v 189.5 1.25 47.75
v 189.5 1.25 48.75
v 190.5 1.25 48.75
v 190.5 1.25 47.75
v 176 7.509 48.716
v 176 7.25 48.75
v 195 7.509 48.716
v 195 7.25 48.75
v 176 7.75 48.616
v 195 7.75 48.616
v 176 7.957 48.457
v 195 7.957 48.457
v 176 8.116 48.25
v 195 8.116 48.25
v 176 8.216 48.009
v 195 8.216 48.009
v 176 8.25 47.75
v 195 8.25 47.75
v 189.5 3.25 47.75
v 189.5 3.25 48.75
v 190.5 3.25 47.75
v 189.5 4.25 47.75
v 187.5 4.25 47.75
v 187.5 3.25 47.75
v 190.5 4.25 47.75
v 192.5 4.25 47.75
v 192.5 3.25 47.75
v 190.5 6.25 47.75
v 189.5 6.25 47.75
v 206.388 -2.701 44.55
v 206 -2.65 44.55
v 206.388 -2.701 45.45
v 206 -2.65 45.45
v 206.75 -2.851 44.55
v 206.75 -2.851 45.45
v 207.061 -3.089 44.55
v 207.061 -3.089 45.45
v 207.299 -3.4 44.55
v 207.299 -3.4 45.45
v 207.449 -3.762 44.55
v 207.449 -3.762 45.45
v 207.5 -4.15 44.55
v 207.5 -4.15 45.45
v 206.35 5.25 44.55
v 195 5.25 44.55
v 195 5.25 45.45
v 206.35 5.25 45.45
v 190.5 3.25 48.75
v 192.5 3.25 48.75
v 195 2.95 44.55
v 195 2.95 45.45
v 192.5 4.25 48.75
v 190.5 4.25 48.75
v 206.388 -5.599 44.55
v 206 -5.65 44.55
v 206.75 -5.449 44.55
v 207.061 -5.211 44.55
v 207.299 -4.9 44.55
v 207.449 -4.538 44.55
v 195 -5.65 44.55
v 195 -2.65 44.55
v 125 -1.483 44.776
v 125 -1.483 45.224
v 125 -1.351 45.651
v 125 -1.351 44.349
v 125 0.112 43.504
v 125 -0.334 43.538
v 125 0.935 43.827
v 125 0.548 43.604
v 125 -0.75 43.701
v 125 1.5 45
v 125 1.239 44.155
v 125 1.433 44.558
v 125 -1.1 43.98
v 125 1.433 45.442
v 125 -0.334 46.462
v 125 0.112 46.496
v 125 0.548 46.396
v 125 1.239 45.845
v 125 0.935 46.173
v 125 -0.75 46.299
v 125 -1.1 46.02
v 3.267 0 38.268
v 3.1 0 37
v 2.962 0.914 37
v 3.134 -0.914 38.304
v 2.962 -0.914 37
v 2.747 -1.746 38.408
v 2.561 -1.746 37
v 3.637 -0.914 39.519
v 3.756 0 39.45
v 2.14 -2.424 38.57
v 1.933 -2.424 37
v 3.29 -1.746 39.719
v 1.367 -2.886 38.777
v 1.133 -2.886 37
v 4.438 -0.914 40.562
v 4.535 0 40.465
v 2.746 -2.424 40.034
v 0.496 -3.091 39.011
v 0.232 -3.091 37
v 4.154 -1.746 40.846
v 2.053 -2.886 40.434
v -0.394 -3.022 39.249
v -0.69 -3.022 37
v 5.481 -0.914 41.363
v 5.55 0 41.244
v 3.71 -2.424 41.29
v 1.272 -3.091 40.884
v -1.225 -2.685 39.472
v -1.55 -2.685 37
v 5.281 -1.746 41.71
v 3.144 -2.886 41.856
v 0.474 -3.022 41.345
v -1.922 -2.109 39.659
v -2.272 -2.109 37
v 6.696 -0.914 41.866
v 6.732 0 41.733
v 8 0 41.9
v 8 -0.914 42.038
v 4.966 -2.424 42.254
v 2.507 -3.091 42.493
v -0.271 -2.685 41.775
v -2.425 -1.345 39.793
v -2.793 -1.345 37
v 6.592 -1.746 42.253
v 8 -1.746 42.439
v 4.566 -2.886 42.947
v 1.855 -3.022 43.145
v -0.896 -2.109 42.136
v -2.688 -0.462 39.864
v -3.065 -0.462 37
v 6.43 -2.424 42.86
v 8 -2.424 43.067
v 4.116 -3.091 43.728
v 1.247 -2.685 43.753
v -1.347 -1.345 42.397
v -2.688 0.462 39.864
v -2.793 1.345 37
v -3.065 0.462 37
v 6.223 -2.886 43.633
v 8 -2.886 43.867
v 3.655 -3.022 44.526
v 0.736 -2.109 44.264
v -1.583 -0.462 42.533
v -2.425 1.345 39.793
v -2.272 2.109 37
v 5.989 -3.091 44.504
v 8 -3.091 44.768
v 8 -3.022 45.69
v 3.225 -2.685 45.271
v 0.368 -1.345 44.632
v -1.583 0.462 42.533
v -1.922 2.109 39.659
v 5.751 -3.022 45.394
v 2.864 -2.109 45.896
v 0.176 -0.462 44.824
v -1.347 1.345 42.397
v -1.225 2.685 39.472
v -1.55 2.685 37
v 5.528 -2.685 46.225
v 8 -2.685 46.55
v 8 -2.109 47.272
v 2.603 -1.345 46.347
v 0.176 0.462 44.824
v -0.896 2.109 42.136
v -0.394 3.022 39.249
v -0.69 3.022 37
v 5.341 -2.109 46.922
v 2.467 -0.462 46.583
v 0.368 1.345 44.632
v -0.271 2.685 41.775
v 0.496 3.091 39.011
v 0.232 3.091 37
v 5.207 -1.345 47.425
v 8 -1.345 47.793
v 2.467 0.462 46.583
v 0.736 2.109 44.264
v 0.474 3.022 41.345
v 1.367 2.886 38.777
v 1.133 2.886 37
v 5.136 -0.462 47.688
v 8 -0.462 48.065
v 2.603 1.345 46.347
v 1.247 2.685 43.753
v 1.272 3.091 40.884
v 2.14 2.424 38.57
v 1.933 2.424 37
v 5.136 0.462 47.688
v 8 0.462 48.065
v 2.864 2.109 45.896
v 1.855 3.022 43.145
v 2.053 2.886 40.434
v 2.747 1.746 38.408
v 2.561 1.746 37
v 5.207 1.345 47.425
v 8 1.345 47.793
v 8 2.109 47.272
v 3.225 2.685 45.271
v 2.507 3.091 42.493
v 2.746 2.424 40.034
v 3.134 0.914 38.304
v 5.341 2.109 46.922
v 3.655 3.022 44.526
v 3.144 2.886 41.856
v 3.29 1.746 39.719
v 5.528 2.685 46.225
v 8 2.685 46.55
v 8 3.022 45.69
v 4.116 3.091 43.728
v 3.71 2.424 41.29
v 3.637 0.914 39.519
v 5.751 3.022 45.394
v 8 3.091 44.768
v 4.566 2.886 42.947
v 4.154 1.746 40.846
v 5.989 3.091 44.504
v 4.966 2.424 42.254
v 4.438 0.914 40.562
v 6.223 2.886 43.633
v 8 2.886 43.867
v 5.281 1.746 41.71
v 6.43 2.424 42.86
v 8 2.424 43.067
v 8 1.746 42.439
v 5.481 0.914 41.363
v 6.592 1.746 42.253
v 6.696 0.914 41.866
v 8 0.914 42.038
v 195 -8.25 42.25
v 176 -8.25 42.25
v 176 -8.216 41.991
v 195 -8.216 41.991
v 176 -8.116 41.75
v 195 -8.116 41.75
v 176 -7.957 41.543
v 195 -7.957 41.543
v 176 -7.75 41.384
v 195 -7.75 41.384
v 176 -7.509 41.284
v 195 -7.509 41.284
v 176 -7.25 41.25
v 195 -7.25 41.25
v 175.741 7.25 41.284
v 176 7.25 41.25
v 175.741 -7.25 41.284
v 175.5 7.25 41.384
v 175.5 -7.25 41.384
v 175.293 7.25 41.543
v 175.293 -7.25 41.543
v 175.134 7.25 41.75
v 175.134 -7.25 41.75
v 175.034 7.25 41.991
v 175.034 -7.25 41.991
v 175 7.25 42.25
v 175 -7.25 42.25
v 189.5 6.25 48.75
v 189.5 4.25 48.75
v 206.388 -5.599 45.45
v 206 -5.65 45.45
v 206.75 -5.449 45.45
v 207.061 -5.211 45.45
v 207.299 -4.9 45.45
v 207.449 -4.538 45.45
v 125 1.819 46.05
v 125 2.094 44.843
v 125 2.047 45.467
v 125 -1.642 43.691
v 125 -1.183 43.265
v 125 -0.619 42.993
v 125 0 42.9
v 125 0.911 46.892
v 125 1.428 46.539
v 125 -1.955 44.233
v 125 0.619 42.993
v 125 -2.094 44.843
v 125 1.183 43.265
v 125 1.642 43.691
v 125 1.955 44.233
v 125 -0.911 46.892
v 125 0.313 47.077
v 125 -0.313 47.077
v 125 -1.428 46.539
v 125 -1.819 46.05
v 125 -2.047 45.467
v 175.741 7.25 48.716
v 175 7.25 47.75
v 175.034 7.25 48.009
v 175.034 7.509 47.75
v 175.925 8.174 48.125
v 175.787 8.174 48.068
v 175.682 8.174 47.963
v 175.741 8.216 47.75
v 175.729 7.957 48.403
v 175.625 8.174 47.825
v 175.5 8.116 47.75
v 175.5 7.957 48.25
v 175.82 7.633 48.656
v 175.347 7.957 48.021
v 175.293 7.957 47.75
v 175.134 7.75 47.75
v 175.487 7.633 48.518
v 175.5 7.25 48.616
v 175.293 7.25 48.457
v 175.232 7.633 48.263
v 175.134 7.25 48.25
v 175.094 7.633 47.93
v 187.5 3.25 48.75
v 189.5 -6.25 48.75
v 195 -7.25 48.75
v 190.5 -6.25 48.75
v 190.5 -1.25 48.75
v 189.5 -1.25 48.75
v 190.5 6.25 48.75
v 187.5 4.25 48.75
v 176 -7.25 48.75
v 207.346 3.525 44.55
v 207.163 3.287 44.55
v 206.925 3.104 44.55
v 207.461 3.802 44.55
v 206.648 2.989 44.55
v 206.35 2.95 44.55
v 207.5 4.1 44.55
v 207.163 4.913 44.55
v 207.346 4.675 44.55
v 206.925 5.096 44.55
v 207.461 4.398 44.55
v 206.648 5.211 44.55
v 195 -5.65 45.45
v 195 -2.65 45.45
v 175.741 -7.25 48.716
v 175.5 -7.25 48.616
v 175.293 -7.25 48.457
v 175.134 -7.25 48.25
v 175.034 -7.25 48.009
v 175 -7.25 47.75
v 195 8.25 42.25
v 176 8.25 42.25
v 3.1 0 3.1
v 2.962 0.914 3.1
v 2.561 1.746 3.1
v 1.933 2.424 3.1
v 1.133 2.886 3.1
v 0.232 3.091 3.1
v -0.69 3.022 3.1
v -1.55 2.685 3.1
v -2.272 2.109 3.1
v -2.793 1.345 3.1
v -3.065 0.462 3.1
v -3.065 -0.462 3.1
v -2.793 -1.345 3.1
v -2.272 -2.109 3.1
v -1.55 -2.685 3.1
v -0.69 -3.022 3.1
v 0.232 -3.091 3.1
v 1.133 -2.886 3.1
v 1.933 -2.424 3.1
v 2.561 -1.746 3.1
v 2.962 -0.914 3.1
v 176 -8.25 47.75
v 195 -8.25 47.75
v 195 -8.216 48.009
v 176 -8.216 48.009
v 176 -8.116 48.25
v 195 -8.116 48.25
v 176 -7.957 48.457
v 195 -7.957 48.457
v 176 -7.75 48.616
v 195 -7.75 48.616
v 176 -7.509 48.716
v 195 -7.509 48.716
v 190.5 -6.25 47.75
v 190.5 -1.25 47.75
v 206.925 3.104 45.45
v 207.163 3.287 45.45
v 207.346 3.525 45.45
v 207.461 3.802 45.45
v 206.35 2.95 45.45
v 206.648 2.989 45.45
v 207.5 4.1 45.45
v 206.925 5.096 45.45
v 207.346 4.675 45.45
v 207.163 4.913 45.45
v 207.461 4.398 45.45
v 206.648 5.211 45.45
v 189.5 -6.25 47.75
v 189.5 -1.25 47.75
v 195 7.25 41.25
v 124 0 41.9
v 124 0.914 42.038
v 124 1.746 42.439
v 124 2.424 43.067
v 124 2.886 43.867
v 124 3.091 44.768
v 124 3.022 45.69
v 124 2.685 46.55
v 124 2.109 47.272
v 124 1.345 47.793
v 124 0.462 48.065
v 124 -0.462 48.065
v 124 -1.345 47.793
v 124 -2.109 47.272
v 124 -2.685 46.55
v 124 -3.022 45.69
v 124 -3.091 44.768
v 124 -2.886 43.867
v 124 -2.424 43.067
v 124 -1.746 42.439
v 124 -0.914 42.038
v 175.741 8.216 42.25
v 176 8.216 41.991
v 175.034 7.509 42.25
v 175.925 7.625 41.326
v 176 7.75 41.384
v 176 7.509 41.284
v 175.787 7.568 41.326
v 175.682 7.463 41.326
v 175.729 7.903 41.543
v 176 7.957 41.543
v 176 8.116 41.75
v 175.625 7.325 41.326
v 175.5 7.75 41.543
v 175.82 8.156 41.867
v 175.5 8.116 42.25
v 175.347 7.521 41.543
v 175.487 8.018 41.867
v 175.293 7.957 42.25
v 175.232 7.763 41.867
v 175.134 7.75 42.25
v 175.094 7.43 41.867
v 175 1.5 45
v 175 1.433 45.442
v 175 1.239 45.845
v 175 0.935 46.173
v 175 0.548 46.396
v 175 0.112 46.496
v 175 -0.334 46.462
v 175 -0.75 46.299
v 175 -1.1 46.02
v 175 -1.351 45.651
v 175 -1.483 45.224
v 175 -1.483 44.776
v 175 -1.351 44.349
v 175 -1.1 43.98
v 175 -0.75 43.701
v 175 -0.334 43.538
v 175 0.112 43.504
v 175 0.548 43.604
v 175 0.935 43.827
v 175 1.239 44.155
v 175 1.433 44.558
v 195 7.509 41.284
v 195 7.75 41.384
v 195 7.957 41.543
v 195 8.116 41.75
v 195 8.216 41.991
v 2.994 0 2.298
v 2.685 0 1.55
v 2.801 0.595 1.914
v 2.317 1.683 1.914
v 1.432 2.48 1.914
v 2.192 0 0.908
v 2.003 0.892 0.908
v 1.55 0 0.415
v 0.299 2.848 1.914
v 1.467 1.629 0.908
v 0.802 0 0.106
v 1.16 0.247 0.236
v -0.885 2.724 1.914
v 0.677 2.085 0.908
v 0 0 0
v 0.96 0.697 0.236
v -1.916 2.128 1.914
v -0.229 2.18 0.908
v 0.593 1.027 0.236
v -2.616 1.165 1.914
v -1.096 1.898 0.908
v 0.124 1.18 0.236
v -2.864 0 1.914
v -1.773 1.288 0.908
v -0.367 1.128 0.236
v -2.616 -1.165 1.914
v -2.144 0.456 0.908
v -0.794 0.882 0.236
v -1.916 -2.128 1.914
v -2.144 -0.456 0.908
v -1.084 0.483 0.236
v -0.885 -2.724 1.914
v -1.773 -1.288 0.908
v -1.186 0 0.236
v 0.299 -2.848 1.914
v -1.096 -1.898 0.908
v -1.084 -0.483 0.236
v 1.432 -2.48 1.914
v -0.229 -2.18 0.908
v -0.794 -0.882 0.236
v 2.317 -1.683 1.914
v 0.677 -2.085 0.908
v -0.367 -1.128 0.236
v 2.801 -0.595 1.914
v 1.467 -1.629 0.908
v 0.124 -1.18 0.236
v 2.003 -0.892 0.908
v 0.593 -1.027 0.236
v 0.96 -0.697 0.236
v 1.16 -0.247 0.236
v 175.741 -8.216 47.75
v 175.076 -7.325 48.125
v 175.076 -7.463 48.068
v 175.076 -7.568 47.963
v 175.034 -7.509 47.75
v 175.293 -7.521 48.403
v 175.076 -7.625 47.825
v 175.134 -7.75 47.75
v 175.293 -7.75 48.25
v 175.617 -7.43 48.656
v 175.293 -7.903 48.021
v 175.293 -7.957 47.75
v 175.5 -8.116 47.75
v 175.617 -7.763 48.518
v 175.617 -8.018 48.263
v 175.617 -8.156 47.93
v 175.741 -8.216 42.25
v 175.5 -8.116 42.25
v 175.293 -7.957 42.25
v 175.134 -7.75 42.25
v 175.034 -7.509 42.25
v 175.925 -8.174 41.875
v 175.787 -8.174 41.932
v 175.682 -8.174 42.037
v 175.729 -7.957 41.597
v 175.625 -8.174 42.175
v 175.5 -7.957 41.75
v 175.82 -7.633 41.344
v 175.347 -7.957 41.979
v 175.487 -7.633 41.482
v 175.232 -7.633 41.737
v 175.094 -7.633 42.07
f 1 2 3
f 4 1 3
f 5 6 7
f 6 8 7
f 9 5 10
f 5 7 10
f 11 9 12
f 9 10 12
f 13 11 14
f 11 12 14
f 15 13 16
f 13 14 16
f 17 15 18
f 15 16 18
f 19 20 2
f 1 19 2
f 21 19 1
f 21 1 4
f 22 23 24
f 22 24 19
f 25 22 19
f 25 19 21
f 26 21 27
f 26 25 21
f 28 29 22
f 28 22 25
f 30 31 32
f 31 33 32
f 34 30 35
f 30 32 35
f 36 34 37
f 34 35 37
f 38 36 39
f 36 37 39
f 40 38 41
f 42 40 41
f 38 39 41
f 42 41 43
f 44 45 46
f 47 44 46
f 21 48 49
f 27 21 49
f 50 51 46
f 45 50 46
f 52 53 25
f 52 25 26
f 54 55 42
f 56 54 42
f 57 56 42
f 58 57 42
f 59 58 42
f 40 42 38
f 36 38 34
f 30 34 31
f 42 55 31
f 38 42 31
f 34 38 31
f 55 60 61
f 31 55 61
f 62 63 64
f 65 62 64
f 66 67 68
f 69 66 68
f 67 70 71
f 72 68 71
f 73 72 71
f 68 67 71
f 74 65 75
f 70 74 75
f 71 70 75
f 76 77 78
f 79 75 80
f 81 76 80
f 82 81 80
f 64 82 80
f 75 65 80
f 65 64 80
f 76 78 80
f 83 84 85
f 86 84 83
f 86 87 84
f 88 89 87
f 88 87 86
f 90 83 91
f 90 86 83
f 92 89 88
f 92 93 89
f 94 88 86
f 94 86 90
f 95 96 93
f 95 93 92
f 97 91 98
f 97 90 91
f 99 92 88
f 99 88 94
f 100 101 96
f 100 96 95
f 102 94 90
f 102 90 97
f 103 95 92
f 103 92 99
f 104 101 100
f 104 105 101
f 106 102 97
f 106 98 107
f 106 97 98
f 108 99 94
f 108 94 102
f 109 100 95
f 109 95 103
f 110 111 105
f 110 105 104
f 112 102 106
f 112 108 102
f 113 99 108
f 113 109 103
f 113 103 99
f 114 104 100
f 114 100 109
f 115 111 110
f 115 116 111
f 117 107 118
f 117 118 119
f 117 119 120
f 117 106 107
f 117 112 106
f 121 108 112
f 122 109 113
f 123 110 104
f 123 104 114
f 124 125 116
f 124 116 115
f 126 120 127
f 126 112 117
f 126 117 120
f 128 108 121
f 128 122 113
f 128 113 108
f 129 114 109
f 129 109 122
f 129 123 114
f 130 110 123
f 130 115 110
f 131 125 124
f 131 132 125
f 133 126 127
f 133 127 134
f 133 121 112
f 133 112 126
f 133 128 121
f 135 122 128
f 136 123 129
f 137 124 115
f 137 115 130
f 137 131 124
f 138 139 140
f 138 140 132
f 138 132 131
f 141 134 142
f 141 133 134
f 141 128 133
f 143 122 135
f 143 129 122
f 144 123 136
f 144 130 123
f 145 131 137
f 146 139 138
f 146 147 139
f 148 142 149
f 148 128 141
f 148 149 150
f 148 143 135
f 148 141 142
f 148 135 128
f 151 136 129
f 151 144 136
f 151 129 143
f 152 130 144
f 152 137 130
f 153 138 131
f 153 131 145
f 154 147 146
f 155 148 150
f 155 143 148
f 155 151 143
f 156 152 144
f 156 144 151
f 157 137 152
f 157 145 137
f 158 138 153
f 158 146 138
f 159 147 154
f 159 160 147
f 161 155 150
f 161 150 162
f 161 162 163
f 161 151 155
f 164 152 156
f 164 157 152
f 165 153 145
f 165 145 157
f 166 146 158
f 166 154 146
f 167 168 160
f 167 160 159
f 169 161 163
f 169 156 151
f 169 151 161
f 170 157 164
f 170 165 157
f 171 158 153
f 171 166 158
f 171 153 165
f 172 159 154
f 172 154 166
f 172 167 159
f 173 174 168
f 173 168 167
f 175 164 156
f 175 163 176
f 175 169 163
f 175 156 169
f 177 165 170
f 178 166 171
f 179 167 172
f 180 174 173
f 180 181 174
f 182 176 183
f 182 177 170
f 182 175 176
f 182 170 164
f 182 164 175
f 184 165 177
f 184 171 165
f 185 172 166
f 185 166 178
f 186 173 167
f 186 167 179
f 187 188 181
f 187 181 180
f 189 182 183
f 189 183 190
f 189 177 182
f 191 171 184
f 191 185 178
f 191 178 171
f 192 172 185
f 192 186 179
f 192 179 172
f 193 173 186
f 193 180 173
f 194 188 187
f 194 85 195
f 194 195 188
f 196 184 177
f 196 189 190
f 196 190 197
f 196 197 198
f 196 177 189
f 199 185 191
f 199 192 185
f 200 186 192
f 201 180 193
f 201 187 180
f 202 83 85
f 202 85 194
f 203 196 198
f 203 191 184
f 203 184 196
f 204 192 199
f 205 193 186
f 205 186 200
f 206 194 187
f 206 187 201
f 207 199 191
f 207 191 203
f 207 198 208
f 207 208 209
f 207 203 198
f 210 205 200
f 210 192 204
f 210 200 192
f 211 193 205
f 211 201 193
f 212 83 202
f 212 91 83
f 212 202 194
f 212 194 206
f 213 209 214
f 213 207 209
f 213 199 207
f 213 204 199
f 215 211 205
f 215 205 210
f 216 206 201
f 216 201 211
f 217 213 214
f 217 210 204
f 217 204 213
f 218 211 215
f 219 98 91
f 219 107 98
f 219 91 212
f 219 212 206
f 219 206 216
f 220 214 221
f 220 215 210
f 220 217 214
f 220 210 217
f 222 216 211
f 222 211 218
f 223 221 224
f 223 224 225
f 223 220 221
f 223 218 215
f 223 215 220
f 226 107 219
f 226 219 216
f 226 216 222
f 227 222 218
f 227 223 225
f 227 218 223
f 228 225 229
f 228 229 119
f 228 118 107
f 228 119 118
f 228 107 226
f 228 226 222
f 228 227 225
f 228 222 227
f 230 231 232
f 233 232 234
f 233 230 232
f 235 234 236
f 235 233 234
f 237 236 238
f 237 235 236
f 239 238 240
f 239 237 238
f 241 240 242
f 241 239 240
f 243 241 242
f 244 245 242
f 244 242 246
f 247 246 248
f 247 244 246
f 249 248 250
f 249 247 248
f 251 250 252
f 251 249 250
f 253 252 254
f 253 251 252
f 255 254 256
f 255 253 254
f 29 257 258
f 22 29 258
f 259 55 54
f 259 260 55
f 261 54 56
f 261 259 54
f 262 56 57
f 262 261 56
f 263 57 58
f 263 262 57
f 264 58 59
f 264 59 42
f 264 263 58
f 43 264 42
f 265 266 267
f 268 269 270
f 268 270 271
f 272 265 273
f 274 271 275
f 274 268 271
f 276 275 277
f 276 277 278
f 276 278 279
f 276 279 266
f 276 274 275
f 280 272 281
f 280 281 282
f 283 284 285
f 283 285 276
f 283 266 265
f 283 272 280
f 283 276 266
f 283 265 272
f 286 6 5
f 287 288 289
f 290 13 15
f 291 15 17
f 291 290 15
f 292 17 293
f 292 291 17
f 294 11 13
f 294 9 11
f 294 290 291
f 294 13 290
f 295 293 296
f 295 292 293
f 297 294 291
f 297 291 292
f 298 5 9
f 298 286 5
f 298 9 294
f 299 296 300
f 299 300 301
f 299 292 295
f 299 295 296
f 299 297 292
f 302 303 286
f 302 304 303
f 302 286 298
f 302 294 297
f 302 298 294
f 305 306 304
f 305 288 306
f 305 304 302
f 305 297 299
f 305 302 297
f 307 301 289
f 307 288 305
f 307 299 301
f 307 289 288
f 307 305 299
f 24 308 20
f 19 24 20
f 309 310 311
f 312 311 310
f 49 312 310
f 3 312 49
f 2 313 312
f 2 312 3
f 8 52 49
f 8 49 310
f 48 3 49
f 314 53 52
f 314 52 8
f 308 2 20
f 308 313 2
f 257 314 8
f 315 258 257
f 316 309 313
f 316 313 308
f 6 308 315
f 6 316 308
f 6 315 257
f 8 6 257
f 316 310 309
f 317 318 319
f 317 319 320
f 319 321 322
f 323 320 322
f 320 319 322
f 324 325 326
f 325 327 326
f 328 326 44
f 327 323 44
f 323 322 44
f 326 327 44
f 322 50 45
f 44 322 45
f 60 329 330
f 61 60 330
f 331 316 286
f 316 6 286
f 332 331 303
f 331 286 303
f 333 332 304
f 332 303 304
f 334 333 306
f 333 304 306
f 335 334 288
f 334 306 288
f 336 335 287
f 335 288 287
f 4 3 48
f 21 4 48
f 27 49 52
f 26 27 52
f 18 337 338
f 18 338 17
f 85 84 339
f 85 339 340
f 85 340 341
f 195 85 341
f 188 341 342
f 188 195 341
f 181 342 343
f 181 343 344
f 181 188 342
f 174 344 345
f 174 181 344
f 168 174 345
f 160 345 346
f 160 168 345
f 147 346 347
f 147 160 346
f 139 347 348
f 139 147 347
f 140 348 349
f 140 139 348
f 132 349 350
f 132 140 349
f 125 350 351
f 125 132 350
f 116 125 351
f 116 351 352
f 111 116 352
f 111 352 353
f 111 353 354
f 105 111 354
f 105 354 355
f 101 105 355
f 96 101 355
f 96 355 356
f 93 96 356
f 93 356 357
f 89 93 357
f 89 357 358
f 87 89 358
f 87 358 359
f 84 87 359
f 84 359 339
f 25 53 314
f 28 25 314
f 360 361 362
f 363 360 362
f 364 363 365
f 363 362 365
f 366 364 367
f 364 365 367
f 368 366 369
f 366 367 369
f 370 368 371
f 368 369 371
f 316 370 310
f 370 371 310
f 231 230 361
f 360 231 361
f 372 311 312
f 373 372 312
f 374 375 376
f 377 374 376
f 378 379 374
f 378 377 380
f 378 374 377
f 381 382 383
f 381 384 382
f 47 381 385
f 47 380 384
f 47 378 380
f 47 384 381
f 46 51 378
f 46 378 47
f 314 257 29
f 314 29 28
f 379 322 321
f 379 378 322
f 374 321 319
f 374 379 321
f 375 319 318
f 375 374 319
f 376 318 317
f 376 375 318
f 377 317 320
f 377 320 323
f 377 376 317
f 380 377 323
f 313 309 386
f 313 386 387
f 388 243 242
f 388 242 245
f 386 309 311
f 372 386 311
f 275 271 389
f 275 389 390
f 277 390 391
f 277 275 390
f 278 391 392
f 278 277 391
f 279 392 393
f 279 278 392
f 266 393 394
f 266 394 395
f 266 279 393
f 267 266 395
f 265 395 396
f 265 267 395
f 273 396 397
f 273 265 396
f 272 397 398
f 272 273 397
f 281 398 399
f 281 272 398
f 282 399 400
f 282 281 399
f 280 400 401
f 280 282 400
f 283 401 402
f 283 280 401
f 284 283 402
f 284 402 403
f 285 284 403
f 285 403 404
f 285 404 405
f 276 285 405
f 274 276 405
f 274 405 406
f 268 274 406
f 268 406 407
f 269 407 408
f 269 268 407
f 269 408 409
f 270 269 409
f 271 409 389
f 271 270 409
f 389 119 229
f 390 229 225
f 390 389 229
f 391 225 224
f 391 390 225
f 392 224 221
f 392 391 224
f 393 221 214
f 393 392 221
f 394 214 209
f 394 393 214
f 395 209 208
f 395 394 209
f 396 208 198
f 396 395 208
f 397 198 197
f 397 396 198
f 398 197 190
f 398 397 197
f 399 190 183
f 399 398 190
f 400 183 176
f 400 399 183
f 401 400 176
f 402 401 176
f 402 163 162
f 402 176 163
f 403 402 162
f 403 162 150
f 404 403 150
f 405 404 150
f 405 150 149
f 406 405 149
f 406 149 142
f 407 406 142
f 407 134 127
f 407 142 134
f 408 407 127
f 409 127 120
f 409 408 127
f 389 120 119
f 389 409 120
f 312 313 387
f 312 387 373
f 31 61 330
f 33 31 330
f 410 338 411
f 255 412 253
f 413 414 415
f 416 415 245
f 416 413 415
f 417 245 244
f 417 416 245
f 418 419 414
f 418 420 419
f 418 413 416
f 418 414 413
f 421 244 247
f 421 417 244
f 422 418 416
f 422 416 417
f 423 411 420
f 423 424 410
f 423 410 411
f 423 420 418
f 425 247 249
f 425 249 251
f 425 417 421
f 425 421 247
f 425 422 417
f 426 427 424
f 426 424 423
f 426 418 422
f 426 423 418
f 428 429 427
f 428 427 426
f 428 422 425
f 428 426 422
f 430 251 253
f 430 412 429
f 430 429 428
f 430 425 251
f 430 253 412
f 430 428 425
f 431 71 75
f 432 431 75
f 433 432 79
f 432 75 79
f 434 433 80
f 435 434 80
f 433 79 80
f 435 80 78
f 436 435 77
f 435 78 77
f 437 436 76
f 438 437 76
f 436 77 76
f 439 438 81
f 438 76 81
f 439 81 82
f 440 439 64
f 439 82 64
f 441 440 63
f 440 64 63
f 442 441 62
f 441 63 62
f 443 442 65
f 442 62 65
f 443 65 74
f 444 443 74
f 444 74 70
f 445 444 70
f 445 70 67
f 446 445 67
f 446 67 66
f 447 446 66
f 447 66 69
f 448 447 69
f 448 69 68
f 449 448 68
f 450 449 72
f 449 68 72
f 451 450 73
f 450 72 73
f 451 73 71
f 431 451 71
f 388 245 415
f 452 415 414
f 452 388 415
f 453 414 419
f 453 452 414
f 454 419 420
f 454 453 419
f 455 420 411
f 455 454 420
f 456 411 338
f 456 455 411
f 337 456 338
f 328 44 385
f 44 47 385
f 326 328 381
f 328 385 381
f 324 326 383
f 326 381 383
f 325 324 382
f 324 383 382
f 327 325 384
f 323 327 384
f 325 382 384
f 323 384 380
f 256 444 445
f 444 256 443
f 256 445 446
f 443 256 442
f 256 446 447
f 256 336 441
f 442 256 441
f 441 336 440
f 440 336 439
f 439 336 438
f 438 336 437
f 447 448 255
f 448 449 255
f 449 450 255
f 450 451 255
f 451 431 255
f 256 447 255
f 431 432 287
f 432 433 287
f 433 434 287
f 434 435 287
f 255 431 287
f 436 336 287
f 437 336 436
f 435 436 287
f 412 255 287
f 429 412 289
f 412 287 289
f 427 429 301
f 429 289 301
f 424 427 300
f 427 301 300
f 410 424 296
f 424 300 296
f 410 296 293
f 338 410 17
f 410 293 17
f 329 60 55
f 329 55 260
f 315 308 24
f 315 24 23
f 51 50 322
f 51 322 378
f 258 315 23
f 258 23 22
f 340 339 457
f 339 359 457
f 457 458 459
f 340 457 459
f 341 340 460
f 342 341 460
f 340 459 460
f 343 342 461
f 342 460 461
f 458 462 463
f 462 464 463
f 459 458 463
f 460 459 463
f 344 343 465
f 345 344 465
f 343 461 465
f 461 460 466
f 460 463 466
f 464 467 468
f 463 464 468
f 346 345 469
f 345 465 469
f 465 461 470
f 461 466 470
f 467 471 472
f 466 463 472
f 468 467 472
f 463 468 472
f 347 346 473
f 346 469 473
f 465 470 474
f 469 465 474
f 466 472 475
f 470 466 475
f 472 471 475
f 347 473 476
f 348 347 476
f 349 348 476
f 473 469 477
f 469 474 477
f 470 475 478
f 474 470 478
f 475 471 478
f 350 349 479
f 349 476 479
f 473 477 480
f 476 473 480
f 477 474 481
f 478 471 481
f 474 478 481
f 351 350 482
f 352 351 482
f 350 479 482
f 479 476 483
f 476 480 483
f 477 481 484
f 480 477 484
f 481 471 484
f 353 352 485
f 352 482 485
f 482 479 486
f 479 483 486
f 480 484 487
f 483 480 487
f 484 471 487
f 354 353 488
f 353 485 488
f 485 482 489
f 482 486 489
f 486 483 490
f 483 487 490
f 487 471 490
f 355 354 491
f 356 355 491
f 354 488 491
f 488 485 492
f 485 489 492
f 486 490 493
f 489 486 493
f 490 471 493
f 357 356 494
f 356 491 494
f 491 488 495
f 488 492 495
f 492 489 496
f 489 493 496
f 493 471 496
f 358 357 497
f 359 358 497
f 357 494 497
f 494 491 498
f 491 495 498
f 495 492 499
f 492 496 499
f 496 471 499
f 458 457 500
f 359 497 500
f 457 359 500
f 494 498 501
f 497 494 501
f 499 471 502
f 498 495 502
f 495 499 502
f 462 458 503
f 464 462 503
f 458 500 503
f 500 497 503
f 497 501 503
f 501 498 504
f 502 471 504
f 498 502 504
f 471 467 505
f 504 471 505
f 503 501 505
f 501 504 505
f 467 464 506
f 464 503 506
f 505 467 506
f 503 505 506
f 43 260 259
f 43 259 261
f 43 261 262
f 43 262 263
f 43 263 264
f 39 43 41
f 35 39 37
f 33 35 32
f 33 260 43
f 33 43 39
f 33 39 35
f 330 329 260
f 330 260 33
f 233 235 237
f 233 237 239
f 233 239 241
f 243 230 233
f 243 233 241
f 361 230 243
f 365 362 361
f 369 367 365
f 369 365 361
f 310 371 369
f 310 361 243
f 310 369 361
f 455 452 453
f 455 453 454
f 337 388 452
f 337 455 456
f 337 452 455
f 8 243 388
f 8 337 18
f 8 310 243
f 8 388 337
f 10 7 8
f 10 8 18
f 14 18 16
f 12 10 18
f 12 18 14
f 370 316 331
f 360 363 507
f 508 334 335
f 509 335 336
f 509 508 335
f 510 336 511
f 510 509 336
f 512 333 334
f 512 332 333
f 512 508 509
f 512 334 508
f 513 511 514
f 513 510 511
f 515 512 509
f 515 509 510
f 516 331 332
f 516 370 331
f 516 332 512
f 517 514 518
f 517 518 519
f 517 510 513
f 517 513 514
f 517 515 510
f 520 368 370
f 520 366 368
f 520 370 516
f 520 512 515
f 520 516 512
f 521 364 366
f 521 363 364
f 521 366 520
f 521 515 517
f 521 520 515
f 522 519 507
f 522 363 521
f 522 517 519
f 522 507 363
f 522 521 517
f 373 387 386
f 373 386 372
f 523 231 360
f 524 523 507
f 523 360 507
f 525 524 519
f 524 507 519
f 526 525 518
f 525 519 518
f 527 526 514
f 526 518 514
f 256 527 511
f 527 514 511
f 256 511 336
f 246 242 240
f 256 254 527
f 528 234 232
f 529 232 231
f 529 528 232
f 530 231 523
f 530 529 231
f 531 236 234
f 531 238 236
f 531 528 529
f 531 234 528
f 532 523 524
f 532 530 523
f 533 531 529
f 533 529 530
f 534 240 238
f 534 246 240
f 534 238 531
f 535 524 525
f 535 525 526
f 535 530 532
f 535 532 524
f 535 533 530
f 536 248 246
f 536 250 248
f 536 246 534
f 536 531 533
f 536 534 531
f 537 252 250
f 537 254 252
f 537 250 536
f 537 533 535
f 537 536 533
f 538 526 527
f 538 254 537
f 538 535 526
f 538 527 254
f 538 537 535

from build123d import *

# Parameters (mm, degrees)
F1_R      = 3.1
F3_R      = 3.1
F4_R      = 1.5
F5_DEPTH  = 50
F6_SIZE   = 1
F7_W      = 16.5
F7_H      = 7.5
F7_R      = 1.5
F8_DEPTH  = 20
F9_W      = 3
F9_H      = 0.9
F10_DEPTH = 12.5
F9_W_2    = 2.3
F11_R     = 1
F12_R     = 1.49999
F13_R     = 1.14999
F14_W     = 1
F14_H     = 5
F14_H_2   = 2
F14_W_2   = 2
F14_H_3   = 1
F15_DEPTH = 1


# Not quite as in the source:
# - a fillet or chamfer is up to 0.001 mm smaller than in the source, because OpenCascade refuses the exact size


with BuildPart() as f2:
    # F2: sweep along a path in F0
    with BuildLine(Plane.XZ) as f2_path:
        Line((0, 0), (0, 37))
        ThreePointArc((0, 37), (2.3431457505, 42.6568542495), (8, 45))
        Line((8, 45), (125, 45))
    # F1 (on Top) → F2 (sweep)
    with BuildSketch(Plane.XY):
        Circle(F1_R)
    sweep(path=f2_path.line)

    # F3
    f3_edges = [f2.edges().sort_by_distance(p)[0] for p in [
        (-3.1, 0, 0),
    ]]
    fillet(f3_edges, radius=F3_R)

    # F6
    f6_edges = [f2.edges().sort_by_distance(p)[0] for p in [
        (125, 0, 48.1),
    ]]
    chamfer(f6_edges, length=F6_SIZE)


with BuildPart() as f5:
    # F4 (on face) → F5 (new body)
    with BuildSketch(Plane.YZ.offset(125)):
        with Locations((0, 45)):
            Circle(F4_R)
    extrude(amount=F5_DEPTH)

    # F7 (on face) → F8 (join)
    with BuildSketch(Plane.YZ.offset(175)):
        with Locations((0, 45)):
            Rectangle(F7_W, F7_H)
        with Locations((0, 45)):
            Circle(F7_R, mode=Mode.SUBTRACT)
        with Locations((0, 45)):
            Circle(F7_R)
    extrude(amount=F8_DEPTH)

    # F11
    f11_edges = [f5.edges().sort_by_distance(p)[0] for p in [
        (185, -8.25, 48.75),
        (175, 0, 48.75),
        (185, 8.25, 48.75),
        (175, 8.25, 45),
        (185, 8.25, 41.25),
        (175, 0, 41.25),
        (185, -8.25, 41.25),
        (175, -8.25, 45),
    ]]
    fillet(f11_edges, radius=F11_R)

    # F14 (on face) → F15 (cut)
    with BuildSketch(Plane.XY.offset(48.75)):
        with Locations((190, -3.75)):
            Rectangle(F14_W, F14_H)
        with Locations((190, 5.25)):
            Rectangle(F14_W, F14_H_2)
        with Locations((191.5, 3.75)):
            Rectangle(F14_W_2, F14_H_3)
        with Locations((190, 3.75)):
            Rectangle(F14_W, F14_H_3)
        with Locations((190, 2.25)):
            Rectangle(F14_W, F14_H_2)
        with Locations((188.5, 3.75)):
            Rectangle(F14_W_2, F14_H_3)
    extrude(amount=-F15_DEPTH, mode=Mode.SUBTRACT)


with BuildPart() as f10:
    # F9 (on face) → F10 (new body)
    with BuildSketch(Plane.YZ.offset(195)):
        with Locations((-4.15, 45)):
            Rectangle(F9_W, F9_H)
    extrude(amount=F10_DEPTH)

    # F12 (radius 1.5 in the source; OpenCascade refuses exactly that, so slightly less here)
    f12_edges = [f10.edges().sort_by_distance(p)[0] for p in [
        (207.5, -2.65, 45),
        (207.5, -5.65, 45),
    ]]
    fillet(f12_edges, radius=F12_R)


with BuildPart() as f10b:
    # F9 (on face) → F10, piece 2 (new body)
    with BuildSketch(Plane.YZ.offset(195)):
        with Locations((4.1, 45)):
            Rectangle(F9_W_2, F9_H)
    extrude(amount=F10_DEPTH)

    # F13 (radius 1.15 in the source; OpenCascade refuses exactly that, so slightly less here)
    f13_edges = [f10b.edges().sort_by_distance(p)[0] for p in [
        (207.5, 5.25, 45),
        (207.5, 2.95, 45),
    ]]
    fillet(f13_edges, radius=F13_R)


solid = Compound([f2.part, f5.part, f10.part, f10b.part])
